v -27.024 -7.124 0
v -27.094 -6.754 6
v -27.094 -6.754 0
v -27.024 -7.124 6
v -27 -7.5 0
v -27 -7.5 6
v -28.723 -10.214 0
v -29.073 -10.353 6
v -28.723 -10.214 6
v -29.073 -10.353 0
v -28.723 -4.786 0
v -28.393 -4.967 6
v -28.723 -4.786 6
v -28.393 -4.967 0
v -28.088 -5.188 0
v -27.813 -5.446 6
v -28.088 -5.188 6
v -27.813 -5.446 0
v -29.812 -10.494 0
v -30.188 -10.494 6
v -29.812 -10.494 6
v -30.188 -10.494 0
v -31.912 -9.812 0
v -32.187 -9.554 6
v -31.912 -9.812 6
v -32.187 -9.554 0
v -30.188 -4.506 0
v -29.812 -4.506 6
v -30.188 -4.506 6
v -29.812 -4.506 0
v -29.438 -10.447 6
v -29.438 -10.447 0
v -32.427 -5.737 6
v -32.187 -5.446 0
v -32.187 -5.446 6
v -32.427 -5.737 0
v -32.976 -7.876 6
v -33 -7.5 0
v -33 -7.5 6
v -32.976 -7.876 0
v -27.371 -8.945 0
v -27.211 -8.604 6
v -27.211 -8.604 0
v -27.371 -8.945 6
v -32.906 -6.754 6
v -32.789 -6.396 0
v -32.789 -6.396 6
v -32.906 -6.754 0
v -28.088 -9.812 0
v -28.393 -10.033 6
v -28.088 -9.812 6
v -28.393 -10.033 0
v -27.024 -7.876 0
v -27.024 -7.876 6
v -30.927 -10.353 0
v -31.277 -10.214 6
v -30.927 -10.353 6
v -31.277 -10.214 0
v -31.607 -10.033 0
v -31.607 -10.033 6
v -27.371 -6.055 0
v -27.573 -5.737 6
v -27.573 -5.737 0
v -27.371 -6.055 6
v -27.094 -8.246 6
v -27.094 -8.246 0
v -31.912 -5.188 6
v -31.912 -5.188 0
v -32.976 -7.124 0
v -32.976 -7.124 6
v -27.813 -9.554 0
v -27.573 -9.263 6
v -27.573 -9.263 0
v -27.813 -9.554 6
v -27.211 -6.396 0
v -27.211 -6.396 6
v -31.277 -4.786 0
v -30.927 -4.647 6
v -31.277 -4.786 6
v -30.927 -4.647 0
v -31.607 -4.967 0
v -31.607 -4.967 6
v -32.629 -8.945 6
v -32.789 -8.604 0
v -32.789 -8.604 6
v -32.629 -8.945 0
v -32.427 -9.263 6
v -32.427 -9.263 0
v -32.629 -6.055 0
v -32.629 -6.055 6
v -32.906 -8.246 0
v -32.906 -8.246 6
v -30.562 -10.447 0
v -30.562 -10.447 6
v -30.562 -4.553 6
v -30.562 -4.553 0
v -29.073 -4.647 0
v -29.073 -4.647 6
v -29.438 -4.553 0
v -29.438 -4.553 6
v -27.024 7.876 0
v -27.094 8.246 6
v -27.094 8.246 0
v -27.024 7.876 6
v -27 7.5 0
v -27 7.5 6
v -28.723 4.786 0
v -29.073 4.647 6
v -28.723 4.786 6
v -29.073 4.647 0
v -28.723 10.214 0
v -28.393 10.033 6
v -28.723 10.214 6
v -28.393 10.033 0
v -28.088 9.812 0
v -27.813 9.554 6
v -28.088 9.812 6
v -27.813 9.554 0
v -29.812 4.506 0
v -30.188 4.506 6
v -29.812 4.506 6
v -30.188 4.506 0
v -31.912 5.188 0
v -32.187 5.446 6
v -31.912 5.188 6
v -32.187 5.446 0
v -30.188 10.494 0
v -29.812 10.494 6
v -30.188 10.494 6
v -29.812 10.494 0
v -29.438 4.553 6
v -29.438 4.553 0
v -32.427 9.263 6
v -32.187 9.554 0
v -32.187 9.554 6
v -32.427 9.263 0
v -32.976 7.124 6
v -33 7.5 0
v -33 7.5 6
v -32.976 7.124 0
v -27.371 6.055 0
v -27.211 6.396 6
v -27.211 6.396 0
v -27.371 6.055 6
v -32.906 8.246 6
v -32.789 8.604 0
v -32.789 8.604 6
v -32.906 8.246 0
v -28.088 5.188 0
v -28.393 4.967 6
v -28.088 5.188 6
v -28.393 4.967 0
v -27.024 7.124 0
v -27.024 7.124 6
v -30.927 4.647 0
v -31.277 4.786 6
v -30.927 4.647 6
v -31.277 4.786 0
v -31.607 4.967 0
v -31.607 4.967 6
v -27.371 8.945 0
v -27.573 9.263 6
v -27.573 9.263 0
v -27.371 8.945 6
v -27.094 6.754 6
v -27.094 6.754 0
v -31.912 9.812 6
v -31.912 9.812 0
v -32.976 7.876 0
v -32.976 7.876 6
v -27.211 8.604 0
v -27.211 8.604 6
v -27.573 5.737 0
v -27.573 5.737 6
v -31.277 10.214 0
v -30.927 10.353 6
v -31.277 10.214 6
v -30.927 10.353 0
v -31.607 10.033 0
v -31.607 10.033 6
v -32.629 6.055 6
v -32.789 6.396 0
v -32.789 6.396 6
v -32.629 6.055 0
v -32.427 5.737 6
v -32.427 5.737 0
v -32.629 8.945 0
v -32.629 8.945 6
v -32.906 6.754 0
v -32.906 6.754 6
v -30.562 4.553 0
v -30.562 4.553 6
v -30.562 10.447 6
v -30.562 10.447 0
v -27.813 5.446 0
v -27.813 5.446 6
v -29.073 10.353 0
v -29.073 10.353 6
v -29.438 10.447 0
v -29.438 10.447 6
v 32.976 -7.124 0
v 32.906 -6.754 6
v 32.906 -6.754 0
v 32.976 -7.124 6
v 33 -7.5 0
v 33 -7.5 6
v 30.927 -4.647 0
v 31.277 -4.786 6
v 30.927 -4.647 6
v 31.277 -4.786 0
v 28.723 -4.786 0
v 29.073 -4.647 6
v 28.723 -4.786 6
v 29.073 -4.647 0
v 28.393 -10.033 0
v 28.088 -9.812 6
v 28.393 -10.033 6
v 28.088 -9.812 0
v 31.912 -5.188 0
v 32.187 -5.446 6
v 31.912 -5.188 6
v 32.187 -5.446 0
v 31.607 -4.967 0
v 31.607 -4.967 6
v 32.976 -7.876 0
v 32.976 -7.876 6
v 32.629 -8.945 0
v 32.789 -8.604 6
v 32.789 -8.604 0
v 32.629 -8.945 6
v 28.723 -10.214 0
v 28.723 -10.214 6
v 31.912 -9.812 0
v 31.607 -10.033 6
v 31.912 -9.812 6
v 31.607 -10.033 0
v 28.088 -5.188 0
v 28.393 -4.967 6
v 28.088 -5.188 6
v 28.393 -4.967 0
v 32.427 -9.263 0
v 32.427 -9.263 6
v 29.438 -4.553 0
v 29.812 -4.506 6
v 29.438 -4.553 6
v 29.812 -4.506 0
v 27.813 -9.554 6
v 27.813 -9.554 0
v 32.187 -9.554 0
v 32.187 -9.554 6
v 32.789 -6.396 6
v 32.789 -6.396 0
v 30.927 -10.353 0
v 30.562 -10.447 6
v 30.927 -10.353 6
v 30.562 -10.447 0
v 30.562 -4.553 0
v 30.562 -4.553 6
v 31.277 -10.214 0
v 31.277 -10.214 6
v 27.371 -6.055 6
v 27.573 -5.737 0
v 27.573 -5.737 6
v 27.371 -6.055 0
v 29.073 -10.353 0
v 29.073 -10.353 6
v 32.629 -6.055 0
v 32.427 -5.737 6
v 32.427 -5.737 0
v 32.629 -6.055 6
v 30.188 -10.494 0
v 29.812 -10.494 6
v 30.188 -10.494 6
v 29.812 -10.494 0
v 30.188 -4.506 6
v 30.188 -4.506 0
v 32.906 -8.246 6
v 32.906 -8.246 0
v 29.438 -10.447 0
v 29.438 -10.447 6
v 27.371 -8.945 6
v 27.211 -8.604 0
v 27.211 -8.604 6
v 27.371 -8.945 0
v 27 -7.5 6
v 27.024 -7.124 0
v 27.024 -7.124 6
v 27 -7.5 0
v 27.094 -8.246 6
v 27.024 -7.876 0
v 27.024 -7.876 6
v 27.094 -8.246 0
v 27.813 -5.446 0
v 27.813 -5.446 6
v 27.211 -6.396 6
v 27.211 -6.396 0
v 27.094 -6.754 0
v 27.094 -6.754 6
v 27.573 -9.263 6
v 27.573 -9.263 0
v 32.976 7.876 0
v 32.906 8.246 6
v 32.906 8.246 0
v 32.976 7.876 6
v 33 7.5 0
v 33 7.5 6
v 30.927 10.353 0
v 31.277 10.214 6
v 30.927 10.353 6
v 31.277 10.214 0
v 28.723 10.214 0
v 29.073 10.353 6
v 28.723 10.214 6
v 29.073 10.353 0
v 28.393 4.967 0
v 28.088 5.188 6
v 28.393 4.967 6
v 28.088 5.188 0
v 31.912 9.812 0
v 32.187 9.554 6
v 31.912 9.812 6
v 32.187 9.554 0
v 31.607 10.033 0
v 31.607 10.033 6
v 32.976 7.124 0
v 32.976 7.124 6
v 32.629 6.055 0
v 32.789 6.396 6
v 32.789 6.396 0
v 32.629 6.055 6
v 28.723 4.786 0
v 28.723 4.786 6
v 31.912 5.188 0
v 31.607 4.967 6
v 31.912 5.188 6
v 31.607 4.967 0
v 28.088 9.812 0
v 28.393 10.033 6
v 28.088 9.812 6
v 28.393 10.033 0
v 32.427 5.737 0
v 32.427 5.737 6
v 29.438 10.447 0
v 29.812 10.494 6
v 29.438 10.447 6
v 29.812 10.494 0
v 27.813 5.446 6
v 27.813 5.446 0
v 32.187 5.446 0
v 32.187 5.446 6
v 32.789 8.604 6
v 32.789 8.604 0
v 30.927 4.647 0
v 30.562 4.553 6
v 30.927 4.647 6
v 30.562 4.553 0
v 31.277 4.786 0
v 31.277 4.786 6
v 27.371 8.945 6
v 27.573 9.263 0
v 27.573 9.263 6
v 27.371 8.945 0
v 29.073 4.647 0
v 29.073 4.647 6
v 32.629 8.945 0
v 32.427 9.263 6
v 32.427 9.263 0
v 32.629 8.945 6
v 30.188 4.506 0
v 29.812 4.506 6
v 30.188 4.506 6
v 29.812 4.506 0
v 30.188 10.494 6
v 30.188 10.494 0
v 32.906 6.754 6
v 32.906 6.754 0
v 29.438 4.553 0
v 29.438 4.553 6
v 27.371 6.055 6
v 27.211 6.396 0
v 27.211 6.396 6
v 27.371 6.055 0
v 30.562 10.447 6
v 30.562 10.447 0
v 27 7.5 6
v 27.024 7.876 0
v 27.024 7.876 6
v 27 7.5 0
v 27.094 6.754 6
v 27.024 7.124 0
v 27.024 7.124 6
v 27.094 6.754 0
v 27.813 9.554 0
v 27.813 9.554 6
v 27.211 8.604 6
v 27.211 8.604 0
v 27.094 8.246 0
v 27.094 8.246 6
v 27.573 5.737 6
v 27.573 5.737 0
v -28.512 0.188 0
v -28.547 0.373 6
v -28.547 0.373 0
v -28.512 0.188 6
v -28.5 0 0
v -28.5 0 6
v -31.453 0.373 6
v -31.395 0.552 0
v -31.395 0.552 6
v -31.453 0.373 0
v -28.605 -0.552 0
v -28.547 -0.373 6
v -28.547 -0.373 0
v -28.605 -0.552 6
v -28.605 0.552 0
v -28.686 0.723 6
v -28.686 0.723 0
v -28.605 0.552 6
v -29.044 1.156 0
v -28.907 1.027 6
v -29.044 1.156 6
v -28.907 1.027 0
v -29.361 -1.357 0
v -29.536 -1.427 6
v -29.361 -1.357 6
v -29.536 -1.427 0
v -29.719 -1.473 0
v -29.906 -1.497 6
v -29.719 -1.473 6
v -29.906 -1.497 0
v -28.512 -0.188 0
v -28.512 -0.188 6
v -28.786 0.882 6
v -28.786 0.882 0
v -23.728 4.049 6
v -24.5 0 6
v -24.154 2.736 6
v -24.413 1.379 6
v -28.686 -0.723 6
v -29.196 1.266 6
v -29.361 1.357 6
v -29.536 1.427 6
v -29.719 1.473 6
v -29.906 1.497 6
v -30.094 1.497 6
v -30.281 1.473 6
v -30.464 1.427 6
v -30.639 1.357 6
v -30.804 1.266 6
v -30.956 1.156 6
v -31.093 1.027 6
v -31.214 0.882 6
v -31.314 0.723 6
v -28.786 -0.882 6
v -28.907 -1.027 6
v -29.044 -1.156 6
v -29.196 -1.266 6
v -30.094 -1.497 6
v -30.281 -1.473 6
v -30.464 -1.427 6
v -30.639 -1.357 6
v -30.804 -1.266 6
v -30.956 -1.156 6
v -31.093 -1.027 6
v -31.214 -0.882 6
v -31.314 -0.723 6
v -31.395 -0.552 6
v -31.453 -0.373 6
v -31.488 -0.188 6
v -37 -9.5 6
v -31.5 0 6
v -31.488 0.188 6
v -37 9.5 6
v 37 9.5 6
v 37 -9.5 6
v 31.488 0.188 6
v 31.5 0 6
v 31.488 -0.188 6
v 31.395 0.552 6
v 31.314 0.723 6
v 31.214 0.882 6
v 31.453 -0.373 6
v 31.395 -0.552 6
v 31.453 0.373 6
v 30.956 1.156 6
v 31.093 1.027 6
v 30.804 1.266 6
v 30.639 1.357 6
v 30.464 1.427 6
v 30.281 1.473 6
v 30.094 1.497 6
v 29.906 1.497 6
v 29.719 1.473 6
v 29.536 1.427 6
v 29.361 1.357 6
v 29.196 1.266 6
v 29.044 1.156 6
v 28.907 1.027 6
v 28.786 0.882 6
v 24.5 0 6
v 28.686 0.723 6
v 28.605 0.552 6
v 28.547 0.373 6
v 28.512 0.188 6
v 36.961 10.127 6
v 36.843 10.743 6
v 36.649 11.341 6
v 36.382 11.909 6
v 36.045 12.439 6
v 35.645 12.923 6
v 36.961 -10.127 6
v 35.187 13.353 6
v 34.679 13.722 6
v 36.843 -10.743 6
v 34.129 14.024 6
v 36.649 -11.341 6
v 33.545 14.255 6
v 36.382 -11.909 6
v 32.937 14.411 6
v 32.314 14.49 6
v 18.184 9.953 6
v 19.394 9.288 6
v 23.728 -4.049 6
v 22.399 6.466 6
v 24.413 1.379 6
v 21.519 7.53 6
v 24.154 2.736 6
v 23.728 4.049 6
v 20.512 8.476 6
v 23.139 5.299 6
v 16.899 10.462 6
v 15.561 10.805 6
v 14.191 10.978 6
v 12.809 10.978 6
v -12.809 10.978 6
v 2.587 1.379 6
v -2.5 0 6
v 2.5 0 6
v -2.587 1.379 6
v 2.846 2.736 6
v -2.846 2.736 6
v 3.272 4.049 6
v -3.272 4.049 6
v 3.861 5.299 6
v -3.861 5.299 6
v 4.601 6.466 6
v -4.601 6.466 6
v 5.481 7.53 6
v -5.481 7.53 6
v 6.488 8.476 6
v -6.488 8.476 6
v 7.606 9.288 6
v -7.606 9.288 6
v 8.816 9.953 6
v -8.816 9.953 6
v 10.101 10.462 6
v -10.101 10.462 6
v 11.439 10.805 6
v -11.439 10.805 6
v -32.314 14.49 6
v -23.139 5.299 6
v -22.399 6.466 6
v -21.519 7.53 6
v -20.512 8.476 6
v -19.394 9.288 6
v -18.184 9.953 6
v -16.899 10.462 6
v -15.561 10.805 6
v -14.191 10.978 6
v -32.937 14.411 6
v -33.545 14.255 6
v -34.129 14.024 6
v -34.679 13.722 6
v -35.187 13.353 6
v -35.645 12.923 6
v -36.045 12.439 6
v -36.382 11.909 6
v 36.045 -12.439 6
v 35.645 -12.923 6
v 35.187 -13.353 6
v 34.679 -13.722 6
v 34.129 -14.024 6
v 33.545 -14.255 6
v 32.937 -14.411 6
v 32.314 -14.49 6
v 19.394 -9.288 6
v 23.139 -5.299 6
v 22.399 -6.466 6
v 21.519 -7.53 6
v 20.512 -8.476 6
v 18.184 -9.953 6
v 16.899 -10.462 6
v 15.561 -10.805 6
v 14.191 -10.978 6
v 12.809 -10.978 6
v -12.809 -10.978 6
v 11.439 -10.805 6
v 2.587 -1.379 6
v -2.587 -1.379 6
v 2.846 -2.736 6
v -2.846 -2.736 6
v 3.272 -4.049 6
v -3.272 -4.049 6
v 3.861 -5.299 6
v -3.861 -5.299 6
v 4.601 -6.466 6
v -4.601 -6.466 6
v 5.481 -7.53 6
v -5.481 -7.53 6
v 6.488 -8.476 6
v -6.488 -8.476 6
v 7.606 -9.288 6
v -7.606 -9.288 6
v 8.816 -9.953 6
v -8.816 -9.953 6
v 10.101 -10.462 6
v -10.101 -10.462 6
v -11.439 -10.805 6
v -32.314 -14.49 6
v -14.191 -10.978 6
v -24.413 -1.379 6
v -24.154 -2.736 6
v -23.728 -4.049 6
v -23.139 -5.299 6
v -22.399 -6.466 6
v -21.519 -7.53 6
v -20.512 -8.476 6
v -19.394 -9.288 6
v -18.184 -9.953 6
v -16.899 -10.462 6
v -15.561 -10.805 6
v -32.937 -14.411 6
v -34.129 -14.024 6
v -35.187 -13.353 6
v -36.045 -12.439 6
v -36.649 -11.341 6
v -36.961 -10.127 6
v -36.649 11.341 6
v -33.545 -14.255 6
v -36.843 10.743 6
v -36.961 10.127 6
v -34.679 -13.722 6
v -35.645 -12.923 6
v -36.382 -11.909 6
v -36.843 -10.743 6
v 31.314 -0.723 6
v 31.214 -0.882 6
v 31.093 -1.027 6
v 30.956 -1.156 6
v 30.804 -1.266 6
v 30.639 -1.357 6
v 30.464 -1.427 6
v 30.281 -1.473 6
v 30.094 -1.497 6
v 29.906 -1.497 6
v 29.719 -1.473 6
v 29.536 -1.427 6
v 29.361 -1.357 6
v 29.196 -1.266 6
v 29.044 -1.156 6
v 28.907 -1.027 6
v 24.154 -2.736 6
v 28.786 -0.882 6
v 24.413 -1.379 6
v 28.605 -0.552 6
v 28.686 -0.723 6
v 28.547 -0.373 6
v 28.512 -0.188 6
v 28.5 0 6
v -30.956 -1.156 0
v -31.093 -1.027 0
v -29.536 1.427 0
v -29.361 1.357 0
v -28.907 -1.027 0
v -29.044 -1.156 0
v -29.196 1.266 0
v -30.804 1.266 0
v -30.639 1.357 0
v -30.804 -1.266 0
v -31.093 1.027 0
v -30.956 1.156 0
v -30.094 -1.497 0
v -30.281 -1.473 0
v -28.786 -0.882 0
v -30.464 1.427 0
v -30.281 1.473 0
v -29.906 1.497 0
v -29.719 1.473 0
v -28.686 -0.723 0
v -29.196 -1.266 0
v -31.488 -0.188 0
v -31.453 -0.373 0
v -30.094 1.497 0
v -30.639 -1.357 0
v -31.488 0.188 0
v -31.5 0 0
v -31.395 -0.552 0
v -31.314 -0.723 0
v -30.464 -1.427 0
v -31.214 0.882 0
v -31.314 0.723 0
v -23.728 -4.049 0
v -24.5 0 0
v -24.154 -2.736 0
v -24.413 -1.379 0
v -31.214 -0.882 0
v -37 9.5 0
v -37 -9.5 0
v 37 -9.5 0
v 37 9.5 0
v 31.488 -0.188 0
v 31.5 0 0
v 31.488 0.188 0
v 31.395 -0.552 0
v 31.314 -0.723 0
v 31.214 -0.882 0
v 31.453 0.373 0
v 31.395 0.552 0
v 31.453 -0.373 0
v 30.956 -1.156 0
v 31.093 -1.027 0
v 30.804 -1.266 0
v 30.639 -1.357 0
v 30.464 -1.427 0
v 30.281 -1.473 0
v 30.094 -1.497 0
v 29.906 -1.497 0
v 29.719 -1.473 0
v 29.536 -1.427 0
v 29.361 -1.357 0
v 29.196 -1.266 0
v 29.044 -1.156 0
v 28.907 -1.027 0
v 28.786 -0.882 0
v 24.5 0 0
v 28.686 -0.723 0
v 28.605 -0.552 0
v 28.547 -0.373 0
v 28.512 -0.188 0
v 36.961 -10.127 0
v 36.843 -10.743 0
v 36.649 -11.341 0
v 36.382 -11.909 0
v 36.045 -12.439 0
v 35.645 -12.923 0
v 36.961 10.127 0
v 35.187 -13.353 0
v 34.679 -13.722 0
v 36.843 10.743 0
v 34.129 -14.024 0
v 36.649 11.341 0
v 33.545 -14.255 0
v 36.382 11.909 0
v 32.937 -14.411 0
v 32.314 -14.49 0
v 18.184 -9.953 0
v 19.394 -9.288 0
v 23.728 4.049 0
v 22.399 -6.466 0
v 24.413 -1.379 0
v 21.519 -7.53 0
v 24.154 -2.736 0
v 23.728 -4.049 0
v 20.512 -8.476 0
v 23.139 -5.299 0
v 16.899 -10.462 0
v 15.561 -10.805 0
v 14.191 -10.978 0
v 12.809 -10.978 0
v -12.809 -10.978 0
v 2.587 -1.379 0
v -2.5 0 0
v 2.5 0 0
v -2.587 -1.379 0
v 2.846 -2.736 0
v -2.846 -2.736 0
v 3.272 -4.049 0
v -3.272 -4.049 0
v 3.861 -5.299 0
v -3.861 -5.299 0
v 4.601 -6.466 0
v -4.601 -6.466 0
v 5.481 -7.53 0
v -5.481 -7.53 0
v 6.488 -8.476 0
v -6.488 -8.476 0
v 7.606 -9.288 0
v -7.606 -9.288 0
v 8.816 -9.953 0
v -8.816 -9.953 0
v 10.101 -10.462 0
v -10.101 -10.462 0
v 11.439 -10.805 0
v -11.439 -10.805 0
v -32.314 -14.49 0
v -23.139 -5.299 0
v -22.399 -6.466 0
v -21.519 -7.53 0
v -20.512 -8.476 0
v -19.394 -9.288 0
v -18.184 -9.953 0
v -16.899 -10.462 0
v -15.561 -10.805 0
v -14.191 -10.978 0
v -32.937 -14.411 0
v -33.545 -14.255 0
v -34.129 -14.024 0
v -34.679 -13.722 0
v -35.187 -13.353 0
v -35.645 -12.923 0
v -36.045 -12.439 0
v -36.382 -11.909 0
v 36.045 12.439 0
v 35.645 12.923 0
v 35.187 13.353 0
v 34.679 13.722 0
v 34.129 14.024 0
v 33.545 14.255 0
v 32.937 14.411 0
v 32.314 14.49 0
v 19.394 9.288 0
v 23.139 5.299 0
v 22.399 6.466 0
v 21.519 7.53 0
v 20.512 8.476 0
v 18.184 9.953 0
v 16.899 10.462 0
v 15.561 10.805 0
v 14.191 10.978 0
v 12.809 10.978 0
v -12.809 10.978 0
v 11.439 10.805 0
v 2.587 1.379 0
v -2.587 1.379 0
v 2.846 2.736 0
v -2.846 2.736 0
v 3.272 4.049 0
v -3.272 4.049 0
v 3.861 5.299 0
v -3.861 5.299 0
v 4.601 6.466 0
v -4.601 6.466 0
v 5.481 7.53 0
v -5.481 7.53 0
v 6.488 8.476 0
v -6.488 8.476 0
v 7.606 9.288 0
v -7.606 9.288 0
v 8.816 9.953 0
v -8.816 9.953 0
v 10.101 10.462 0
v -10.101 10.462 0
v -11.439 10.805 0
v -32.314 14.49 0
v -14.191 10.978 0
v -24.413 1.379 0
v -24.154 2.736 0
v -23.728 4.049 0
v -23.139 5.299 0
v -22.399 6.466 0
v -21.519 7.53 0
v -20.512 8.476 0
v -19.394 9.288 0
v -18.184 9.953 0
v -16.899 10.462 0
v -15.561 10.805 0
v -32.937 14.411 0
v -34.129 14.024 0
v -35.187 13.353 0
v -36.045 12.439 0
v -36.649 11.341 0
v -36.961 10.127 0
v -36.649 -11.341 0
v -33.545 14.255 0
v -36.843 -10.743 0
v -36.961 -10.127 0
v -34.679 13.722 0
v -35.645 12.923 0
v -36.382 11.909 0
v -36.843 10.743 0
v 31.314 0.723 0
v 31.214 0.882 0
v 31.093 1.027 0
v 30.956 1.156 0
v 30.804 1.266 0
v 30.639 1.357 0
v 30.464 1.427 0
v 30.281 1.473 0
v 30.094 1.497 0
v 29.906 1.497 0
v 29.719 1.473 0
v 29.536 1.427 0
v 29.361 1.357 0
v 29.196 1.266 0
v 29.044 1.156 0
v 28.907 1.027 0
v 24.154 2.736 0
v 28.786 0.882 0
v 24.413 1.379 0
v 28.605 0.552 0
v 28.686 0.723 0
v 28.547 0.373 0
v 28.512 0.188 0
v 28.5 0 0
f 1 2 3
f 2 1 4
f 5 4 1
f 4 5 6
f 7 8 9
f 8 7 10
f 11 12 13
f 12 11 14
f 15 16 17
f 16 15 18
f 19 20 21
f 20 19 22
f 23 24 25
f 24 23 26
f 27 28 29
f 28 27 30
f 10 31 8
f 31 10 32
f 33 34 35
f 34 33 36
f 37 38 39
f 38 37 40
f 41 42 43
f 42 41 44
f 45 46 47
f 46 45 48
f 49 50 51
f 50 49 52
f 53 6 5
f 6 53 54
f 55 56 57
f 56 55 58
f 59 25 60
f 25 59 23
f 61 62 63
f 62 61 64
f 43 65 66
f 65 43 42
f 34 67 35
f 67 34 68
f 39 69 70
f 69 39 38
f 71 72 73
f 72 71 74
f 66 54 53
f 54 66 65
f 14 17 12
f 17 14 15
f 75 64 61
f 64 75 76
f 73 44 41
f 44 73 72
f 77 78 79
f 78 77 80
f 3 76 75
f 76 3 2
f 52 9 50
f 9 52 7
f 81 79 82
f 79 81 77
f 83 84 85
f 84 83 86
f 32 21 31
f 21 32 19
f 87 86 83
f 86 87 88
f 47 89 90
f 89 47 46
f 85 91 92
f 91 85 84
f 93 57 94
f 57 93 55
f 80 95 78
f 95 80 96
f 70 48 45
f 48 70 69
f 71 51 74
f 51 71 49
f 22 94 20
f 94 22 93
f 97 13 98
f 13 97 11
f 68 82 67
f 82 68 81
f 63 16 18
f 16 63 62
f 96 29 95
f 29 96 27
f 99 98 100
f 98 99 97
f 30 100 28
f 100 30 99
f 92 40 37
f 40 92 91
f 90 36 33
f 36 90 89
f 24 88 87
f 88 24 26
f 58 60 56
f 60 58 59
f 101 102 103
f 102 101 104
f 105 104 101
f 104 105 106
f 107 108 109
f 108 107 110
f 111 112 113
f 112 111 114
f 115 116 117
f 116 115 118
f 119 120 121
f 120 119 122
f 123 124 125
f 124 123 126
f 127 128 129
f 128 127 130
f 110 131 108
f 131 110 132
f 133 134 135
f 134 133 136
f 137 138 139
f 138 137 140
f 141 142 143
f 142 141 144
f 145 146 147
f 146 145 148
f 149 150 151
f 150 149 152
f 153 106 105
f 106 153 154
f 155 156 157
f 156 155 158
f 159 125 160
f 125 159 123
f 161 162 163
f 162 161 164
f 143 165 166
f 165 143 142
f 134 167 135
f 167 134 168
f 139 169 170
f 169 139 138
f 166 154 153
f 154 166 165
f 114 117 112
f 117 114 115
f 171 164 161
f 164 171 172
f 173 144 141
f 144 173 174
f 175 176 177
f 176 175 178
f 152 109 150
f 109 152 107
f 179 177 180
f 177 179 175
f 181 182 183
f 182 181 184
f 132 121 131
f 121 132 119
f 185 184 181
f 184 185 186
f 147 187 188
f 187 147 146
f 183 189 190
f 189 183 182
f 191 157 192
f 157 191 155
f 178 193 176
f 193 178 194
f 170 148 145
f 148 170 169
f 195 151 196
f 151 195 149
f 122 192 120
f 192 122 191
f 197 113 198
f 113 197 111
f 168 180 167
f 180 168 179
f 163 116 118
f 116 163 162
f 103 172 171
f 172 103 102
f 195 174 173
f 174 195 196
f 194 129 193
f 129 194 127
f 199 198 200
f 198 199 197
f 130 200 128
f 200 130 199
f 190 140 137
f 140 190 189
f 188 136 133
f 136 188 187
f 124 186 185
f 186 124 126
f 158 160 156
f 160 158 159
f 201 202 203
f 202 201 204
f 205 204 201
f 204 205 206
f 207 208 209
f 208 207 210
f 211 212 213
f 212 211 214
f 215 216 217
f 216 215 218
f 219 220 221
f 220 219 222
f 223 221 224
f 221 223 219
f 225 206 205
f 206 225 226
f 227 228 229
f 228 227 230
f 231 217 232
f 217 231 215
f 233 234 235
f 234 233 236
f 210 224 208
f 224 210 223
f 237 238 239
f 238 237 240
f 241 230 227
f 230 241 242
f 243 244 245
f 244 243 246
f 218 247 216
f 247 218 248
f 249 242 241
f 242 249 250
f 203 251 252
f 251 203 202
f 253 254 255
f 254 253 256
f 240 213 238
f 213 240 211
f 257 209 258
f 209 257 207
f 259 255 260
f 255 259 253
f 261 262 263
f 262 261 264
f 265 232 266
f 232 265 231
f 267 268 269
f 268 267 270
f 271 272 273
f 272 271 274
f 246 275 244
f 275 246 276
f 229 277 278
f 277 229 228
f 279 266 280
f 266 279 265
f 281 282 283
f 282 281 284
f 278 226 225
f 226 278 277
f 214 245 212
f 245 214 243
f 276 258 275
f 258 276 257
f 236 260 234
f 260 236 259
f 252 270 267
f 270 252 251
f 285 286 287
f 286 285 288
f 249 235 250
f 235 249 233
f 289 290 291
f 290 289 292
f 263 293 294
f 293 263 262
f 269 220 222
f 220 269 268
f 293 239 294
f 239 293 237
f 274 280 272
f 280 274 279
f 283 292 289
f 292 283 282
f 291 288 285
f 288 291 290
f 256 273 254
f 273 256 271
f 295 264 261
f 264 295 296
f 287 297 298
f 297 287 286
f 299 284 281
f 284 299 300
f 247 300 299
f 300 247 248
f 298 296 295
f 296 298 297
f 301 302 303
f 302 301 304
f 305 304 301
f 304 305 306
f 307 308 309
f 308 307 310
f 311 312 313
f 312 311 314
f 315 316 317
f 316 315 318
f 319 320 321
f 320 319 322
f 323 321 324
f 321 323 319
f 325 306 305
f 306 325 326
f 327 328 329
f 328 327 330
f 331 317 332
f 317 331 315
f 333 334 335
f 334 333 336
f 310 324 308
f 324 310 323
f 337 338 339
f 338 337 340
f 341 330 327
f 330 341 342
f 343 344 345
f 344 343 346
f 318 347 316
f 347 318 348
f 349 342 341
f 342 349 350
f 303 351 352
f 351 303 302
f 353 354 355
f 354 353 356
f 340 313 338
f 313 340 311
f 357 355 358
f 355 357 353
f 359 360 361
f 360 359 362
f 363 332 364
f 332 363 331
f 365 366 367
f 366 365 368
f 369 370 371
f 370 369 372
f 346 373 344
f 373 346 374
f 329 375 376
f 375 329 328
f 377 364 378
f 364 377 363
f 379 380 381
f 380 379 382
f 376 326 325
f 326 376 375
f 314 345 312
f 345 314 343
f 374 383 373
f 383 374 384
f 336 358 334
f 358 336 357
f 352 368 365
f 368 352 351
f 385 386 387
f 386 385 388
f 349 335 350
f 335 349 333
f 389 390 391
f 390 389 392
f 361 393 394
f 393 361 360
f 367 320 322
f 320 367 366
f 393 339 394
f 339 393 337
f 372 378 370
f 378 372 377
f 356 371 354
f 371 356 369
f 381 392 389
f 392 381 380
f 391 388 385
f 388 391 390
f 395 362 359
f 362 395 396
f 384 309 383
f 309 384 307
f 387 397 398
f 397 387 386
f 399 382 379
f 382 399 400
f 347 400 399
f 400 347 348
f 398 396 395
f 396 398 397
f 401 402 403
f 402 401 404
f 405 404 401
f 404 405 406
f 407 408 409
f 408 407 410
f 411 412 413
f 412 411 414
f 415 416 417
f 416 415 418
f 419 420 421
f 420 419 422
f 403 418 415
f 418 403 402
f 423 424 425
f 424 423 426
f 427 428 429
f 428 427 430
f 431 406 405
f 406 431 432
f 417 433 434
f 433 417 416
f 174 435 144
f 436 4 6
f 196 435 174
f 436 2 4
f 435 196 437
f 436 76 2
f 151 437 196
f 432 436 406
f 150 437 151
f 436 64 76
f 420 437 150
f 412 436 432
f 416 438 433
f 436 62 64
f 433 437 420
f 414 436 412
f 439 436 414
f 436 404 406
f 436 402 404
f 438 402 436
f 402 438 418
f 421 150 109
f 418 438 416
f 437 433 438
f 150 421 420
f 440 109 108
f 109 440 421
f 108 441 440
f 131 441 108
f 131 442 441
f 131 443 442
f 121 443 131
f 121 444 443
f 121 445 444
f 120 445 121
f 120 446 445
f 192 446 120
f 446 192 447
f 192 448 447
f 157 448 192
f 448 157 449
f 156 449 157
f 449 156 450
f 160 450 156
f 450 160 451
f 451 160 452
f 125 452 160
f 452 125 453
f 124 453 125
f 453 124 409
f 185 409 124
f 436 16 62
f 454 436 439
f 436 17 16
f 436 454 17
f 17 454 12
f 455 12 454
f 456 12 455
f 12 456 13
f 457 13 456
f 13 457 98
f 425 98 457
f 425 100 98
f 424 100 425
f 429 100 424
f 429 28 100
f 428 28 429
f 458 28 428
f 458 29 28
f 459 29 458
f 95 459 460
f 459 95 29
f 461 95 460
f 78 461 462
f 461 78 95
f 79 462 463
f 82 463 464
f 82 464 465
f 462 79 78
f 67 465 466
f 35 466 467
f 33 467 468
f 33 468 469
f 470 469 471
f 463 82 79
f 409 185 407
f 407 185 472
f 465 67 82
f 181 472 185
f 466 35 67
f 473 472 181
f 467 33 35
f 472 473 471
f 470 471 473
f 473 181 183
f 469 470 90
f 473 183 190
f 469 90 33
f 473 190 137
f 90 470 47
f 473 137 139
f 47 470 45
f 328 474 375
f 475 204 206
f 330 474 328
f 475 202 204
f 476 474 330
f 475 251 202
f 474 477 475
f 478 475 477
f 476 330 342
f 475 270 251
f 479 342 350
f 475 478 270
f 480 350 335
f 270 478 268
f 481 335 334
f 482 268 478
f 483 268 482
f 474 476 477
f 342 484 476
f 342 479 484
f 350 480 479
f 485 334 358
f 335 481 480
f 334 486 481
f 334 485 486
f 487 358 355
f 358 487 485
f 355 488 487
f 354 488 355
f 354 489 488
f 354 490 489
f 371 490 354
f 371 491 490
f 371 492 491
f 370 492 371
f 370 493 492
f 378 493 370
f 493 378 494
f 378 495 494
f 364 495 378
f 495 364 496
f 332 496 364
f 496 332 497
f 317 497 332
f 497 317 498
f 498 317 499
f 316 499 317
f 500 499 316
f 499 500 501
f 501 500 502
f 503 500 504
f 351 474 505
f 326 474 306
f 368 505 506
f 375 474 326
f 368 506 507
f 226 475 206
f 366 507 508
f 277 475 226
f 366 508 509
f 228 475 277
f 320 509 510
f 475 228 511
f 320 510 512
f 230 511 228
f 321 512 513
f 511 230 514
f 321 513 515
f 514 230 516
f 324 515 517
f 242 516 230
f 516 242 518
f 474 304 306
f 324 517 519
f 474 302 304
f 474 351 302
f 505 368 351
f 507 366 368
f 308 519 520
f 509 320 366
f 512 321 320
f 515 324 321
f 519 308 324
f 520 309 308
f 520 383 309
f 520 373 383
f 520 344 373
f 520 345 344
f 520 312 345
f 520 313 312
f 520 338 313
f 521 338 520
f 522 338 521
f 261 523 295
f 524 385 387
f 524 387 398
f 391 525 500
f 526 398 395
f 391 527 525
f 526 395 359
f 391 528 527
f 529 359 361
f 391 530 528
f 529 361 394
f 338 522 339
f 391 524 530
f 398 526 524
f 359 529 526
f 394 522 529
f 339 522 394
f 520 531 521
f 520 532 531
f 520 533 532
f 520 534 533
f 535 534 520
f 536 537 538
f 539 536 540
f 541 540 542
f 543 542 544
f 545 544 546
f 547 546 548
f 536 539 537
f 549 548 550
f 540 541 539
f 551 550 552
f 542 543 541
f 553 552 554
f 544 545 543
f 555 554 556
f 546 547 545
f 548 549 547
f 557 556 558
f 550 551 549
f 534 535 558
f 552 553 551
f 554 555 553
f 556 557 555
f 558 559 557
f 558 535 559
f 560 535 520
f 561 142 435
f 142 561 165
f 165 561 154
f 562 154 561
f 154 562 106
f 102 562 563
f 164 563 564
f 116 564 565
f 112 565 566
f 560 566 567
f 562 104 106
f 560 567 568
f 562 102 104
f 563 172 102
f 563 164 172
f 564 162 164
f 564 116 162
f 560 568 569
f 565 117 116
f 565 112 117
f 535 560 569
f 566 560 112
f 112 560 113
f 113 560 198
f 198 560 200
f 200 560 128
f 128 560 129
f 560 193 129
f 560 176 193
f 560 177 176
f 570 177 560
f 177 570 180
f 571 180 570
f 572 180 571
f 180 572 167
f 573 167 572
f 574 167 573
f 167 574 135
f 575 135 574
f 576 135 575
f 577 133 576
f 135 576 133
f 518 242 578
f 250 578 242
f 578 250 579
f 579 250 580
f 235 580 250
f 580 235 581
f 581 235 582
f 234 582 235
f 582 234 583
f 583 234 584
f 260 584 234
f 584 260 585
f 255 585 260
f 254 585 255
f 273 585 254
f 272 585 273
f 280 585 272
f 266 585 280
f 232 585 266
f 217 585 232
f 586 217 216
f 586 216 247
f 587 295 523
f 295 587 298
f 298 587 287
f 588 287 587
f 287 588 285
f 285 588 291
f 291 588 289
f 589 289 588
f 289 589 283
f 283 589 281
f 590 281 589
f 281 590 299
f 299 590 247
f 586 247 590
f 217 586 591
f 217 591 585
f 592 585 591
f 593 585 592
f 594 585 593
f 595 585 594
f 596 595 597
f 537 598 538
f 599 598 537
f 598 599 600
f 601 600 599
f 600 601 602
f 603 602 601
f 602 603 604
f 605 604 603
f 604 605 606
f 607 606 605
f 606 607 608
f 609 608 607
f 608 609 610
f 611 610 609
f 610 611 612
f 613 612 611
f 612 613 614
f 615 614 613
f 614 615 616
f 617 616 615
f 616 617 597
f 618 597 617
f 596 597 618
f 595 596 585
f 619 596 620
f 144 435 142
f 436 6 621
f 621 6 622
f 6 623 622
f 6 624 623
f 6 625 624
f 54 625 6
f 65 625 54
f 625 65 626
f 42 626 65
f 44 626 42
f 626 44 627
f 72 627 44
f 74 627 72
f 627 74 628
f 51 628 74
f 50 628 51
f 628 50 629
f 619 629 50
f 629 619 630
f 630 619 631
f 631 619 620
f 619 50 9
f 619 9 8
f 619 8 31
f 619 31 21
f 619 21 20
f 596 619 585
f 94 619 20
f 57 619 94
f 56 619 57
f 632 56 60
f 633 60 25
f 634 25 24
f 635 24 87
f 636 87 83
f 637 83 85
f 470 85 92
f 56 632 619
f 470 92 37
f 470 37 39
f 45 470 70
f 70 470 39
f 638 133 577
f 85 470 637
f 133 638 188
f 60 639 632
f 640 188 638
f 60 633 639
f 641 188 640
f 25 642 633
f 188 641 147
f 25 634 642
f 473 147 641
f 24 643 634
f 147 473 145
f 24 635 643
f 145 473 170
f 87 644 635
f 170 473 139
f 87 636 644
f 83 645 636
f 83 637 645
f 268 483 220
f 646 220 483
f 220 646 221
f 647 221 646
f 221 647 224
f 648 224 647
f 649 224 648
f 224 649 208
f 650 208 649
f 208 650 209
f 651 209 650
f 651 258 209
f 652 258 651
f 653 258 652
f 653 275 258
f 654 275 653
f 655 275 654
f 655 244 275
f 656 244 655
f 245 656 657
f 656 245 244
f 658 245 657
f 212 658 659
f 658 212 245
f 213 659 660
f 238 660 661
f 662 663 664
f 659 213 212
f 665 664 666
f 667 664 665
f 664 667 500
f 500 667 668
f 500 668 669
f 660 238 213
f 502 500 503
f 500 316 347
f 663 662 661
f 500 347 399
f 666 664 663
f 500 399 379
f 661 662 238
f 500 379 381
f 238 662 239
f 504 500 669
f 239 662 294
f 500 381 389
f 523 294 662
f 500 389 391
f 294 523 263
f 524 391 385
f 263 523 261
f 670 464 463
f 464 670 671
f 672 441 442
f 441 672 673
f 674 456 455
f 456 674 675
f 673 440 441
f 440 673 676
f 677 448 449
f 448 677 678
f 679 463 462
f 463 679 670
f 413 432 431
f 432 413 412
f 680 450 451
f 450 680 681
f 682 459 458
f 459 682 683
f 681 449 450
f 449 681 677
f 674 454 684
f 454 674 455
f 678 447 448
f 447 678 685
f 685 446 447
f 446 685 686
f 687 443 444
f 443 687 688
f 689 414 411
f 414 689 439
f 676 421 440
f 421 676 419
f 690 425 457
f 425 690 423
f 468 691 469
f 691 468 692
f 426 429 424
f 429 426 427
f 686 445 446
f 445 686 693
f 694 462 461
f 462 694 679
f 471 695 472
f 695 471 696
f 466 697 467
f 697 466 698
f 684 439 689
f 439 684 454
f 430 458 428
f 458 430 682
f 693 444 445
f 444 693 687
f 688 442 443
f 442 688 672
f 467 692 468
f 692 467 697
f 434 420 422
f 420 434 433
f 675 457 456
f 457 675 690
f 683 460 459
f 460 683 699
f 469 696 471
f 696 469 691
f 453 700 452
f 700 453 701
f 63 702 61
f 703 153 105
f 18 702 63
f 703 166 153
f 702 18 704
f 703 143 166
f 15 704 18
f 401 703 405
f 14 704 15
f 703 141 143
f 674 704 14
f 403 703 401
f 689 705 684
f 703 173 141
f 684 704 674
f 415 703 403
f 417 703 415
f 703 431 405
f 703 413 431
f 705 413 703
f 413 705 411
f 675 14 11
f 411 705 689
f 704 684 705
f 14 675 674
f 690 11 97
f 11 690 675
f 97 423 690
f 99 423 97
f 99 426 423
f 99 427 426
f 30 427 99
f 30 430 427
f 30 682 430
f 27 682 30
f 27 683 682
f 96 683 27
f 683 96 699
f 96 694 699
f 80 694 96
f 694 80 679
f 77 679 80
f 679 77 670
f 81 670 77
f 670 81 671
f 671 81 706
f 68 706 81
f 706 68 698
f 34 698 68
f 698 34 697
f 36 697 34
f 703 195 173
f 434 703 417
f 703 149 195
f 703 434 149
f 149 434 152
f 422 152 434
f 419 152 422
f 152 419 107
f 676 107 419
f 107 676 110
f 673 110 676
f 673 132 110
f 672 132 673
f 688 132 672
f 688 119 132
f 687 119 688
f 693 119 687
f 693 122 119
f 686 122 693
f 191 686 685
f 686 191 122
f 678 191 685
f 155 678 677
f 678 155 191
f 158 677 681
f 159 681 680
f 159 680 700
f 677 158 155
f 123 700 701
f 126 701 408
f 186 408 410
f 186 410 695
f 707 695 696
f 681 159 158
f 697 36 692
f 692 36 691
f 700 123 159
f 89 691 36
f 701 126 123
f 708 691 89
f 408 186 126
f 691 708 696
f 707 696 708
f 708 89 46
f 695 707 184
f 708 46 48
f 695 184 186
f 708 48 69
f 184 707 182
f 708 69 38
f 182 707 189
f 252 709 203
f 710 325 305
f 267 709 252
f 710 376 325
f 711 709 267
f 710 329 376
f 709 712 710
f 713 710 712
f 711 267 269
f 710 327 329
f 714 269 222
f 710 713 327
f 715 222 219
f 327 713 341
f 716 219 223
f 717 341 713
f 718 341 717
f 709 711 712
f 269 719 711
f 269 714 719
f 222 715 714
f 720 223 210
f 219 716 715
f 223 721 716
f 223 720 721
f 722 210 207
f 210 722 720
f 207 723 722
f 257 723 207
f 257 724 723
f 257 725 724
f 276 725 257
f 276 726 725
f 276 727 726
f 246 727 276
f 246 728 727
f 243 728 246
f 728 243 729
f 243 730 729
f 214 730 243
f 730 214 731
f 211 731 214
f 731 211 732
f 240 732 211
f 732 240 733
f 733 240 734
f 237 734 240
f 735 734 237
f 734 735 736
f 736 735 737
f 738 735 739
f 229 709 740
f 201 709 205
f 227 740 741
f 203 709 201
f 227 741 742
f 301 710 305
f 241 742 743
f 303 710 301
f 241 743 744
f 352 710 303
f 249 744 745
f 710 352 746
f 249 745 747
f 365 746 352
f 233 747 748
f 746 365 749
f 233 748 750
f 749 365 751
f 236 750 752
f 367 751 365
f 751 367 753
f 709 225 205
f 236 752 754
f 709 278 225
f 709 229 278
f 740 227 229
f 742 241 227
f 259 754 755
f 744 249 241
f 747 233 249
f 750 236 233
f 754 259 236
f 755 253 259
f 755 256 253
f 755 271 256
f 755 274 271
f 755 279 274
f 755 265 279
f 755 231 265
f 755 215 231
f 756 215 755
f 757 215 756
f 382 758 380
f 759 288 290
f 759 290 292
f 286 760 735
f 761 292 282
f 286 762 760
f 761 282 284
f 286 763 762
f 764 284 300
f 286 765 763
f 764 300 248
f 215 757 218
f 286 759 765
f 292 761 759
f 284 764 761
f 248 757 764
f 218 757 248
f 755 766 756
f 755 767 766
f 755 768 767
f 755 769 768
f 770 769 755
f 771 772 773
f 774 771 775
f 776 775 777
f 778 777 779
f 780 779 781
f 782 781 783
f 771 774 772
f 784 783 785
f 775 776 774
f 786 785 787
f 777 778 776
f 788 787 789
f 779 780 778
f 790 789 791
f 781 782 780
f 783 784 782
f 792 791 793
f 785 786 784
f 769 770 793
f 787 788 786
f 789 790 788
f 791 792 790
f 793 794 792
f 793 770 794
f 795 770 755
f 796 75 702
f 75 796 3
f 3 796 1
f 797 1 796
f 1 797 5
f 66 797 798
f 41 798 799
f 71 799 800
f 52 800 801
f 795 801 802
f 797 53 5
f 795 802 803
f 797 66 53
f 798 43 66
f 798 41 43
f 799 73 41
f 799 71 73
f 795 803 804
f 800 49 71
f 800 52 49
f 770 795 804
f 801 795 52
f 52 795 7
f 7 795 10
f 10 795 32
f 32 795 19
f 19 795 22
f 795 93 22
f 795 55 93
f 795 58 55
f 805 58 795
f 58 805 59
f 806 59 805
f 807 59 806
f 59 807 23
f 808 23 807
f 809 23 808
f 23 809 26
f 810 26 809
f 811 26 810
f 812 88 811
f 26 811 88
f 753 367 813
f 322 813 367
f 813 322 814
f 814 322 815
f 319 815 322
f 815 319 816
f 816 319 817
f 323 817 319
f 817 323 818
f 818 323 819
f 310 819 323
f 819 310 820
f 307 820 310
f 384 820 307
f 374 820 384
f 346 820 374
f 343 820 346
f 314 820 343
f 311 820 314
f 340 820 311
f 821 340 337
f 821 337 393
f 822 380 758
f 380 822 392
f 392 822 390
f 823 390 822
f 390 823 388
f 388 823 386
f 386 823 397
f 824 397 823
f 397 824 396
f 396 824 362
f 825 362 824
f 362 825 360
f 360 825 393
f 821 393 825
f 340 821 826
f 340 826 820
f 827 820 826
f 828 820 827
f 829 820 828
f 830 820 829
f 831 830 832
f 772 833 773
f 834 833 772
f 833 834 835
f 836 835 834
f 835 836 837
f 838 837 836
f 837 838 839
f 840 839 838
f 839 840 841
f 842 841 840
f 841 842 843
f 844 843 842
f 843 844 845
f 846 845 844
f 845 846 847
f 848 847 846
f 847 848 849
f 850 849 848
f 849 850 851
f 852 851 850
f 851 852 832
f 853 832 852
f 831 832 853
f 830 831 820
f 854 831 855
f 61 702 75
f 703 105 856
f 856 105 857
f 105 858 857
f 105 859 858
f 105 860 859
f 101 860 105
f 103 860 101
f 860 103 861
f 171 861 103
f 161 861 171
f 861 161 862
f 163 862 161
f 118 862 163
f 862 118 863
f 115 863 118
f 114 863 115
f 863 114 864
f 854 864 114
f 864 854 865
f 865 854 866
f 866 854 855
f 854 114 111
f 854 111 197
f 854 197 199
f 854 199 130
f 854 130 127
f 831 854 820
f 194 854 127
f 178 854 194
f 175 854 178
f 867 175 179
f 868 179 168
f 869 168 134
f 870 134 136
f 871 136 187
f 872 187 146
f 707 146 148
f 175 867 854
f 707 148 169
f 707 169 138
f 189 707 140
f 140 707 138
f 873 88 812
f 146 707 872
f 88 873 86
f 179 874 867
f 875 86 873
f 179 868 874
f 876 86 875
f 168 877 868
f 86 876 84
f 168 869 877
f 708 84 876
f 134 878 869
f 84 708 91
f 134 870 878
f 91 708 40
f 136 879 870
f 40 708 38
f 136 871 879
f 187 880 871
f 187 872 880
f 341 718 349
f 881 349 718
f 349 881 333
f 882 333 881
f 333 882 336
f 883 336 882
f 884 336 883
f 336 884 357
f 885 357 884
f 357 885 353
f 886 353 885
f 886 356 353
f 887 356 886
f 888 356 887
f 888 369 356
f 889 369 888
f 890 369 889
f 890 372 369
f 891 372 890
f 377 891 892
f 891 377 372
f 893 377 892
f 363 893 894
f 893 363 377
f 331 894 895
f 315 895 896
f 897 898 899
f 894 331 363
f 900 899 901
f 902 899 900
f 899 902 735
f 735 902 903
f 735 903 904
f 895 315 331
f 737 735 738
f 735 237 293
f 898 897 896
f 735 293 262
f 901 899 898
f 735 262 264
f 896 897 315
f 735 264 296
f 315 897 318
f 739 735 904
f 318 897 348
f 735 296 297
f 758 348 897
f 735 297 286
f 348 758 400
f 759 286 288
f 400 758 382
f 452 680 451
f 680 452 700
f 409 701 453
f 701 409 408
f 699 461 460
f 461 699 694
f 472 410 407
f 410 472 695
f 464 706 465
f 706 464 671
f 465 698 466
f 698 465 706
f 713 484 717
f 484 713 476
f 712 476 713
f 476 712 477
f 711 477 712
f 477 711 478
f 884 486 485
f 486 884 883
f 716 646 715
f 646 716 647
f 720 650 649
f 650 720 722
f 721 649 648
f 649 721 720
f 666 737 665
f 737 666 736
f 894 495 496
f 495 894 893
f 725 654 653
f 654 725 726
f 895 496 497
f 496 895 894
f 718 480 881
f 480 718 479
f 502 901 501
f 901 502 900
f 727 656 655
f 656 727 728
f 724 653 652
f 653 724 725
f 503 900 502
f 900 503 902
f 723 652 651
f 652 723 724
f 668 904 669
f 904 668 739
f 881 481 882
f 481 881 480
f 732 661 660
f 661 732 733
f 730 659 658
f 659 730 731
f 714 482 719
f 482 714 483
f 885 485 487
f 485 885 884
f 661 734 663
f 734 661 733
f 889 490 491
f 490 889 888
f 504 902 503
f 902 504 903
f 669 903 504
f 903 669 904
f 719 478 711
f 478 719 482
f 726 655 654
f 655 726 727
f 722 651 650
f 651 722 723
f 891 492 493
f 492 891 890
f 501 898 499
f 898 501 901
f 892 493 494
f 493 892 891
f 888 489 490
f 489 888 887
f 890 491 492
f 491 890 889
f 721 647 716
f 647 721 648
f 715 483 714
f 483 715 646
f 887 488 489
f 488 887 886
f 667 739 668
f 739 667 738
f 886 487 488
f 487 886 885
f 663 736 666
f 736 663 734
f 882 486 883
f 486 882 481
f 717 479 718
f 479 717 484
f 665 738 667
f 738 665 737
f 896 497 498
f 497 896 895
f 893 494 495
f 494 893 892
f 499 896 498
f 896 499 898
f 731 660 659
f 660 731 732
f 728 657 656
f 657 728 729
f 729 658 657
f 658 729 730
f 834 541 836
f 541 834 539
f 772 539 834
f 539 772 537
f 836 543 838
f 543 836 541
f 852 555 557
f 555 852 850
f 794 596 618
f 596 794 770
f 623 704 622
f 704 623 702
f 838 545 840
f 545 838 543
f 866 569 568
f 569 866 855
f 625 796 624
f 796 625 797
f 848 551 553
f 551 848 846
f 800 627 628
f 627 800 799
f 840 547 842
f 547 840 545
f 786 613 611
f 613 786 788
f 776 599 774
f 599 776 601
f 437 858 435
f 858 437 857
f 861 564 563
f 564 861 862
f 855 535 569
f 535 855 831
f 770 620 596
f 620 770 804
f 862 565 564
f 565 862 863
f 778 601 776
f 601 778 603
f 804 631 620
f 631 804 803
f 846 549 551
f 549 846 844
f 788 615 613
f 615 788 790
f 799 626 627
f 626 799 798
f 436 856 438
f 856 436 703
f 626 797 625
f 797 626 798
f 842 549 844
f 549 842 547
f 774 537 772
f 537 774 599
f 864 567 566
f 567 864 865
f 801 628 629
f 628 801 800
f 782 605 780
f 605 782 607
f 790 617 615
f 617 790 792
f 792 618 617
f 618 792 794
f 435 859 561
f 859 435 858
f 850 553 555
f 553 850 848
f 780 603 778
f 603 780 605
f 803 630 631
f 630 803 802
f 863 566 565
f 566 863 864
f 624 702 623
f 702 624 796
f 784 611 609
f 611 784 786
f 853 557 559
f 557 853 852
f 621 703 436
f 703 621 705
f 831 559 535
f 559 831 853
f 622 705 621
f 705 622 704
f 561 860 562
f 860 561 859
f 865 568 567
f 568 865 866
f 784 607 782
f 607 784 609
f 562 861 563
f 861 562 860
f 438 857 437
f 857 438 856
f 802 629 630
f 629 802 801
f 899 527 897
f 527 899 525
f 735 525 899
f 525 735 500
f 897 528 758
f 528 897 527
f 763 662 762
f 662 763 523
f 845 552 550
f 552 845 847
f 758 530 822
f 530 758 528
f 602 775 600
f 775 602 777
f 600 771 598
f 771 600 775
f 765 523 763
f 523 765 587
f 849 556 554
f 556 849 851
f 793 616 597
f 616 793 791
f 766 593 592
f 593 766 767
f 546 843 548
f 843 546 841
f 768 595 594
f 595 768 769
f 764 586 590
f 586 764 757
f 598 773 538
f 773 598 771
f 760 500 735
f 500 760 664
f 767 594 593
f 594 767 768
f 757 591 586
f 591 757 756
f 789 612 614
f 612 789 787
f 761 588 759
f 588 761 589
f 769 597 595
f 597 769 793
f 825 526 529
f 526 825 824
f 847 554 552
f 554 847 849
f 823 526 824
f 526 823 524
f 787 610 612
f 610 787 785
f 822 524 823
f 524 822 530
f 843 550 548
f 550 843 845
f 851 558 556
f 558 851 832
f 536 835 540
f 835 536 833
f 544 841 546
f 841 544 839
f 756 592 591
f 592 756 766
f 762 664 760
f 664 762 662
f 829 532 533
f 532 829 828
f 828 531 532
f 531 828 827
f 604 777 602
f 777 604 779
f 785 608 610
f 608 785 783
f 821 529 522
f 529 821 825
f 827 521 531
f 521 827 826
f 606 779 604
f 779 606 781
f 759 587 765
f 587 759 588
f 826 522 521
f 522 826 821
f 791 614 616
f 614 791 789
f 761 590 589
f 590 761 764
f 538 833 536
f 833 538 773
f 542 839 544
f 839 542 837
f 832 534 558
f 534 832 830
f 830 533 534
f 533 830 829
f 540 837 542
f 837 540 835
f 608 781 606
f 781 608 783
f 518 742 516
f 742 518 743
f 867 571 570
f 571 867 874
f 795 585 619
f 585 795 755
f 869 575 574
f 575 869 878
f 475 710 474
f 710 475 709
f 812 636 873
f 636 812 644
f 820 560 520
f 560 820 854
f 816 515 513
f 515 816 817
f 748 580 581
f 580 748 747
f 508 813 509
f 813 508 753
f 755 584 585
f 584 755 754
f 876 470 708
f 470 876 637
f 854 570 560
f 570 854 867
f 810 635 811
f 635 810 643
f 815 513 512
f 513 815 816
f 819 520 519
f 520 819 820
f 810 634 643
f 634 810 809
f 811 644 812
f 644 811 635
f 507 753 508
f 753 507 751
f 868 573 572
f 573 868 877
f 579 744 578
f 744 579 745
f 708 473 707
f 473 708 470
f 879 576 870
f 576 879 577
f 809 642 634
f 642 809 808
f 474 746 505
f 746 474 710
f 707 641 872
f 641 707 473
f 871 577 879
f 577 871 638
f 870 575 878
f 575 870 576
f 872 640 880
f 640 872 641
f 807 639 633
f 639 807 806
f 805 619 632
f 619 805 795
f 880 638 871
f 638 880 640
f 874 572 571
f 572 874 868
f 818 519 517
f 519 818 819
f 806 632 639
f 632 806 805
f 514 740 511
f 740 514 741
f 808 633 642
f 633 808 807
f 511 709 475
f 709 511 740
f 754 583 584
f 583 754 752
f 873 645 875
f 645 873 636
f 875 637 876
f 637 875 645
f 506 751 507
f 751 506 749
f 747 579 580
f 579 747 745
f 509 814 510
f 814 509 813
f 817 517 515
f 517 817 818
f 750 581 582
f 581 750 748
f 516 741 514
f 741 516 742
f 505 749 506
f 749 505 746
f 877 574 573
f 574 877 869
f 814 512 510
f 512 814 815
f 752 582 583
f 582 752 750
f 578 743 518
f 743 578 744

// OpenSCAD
$fn = 50;


difference() {
	union() {
		hull() {
			translate(v = [-32.0000000000, 9.5000000000, 0]) {
				cylinder(h = 6, r = 5);
			}
			translate(v = [32.0000000000, 9.5000000000, 0]) {
				cylinder(h = 6, r = 5);
			}
			translate(v = [-32.0000000000, -9.5000000000, 0]) {
				cylinder(h = 6, r = 5);
			}
			translate(v = [32.0000000000, -9.5000000000, 0]) {
				cylinder(h = 6, r = 5);
			}
		}
	}
	union() {
		#translate(v = [-30.0000000000, -7.5000000000, 0]) {
			cylinder(h = 6, r = 3.0000000000);
		}
		#translate(v = [-30.0000000000, 7.5000000000, 0]) {
			cylinder(h = 6, r = 3.0000000000);
		}
		#translate(v = [30.0000000000, -7.5000000000, 0]) {
			cylinder(h = 6, r = 3.0000000000);
		}
		#translate(v = [30.0000000000, 7.5000000000, 0]) {
			cylinder(h = 6, r = 3.0000000000);
		}
		#translate(v = [-30.0000000000, -7.5000000000, -100.0000000000]) {
			cylinder(h = 200, r = 3.0000000000);
		}
		#translate(v = [-30.0000000000, 7.5000000000, -100.0000000000]) {
			cylinder(h = 200, r = 3.0000000000);
		}
		#translate(v = [30.0000000000, -7.5000000000, -100.0000000000]) {
			cylinder(h = 200, r = 3.0000000000);
		}
		#translate(v = [30.0000000000, 7.5000000000, -100.0000000000]) {
			cylinder(h = 200, r = 3.0000000000);
		}
		#translate(v = [-30.0000000000, -7.5000000000, 0]) {
			cylinder(h = 6, r = 1.5000000000);
		}
		#translate(v = [-30.0000000000, 0.0000000000, 0]) {
			cylinder(h = 6, r = 1.5000000000);
		}
		#translate(v = [-30.0000000000, 7.5000000000, 0]) {
			cylinder(h = 6, r = 1.5000000000);
		}
		#translate(v = [30.0000000000, -7.5000000000, 0]) {
			cylinder(h = 6, r = 1.5000000000);
		}
		#translate(v = [30.0000000000, 0.0000000000, 0]) {
			cylinder(h = 6, r = 1.5000000000);
		}
		#translate(v = [30.0000000000, 7.5000000000, 0]) {
			cylinder(h = 6, r = 1.5000000000);
		}
		#translate(v = [-30.0000000000, -7.5000000000, 0]) {
			cylinder(h = 6, r = 1.5000000000);
		}
		#translate(v = [-30.0000000000, 0.0000000000, 0]) {
			cylinder(h = 6, r = 1.5000000000);
		}
		#translate(v = [-30.0000000000, 7.5000000000, 0]) {
			cylinder(h = 6, r = 1.5000000000);
		}
		#translate(v = [30.0000000000, -7.5000000000, 0]) {
			cylinder(h = 6, r = 1.5000000000);
		}
		#translate(v = [30.0000000000, 0.0000000000, 0]) {
			cylinder(h = 6, r = 1.5000000000);
		}
		#translate(v = [30.0000000000, 7.5000000000, 0]) {
			cylinder(h = 6, r = 1.5000000000);
		}
		#translate(v = [-30.0000000000, -7.5000000000, 0]) {
			cylinder(h = 6, r = 1.5000000000);
		}
		#translate(v = [-30.0000000000, 0.0000000000, 0]) {
			cylinder(h = 6, r = 1.5000000000);
		}
		#translate(v = [-30.0000000000, 7.5000000000, 0]) {
			cylinder(h = 6, r = 1.5000000000);
		}
		#translate(v = [30.0000000000, -7.5000000000, 0]) {
			cylinder(h = 6, r = 1.5000000000);
		}
		#translate(v = [30.0000000000, 0.0000000000, 0]) {
			cylinder(h = 6, r = 1.5000000000);
		}
		#translate(v = [30.0000000000, 7.5000000000, 0]) {
			cylinder(h = 6, r = 1.5000000000);
		}
		#translate(v = [-13.5000000000, 0, 0]) {
			cylinder(h = 6, r = 11.0000000000);
		}
		#translate(v = [13.5000000000, 0, 0]) {
			cylinder(h = 6, r = 11.0000000000);
		}
	}
}
